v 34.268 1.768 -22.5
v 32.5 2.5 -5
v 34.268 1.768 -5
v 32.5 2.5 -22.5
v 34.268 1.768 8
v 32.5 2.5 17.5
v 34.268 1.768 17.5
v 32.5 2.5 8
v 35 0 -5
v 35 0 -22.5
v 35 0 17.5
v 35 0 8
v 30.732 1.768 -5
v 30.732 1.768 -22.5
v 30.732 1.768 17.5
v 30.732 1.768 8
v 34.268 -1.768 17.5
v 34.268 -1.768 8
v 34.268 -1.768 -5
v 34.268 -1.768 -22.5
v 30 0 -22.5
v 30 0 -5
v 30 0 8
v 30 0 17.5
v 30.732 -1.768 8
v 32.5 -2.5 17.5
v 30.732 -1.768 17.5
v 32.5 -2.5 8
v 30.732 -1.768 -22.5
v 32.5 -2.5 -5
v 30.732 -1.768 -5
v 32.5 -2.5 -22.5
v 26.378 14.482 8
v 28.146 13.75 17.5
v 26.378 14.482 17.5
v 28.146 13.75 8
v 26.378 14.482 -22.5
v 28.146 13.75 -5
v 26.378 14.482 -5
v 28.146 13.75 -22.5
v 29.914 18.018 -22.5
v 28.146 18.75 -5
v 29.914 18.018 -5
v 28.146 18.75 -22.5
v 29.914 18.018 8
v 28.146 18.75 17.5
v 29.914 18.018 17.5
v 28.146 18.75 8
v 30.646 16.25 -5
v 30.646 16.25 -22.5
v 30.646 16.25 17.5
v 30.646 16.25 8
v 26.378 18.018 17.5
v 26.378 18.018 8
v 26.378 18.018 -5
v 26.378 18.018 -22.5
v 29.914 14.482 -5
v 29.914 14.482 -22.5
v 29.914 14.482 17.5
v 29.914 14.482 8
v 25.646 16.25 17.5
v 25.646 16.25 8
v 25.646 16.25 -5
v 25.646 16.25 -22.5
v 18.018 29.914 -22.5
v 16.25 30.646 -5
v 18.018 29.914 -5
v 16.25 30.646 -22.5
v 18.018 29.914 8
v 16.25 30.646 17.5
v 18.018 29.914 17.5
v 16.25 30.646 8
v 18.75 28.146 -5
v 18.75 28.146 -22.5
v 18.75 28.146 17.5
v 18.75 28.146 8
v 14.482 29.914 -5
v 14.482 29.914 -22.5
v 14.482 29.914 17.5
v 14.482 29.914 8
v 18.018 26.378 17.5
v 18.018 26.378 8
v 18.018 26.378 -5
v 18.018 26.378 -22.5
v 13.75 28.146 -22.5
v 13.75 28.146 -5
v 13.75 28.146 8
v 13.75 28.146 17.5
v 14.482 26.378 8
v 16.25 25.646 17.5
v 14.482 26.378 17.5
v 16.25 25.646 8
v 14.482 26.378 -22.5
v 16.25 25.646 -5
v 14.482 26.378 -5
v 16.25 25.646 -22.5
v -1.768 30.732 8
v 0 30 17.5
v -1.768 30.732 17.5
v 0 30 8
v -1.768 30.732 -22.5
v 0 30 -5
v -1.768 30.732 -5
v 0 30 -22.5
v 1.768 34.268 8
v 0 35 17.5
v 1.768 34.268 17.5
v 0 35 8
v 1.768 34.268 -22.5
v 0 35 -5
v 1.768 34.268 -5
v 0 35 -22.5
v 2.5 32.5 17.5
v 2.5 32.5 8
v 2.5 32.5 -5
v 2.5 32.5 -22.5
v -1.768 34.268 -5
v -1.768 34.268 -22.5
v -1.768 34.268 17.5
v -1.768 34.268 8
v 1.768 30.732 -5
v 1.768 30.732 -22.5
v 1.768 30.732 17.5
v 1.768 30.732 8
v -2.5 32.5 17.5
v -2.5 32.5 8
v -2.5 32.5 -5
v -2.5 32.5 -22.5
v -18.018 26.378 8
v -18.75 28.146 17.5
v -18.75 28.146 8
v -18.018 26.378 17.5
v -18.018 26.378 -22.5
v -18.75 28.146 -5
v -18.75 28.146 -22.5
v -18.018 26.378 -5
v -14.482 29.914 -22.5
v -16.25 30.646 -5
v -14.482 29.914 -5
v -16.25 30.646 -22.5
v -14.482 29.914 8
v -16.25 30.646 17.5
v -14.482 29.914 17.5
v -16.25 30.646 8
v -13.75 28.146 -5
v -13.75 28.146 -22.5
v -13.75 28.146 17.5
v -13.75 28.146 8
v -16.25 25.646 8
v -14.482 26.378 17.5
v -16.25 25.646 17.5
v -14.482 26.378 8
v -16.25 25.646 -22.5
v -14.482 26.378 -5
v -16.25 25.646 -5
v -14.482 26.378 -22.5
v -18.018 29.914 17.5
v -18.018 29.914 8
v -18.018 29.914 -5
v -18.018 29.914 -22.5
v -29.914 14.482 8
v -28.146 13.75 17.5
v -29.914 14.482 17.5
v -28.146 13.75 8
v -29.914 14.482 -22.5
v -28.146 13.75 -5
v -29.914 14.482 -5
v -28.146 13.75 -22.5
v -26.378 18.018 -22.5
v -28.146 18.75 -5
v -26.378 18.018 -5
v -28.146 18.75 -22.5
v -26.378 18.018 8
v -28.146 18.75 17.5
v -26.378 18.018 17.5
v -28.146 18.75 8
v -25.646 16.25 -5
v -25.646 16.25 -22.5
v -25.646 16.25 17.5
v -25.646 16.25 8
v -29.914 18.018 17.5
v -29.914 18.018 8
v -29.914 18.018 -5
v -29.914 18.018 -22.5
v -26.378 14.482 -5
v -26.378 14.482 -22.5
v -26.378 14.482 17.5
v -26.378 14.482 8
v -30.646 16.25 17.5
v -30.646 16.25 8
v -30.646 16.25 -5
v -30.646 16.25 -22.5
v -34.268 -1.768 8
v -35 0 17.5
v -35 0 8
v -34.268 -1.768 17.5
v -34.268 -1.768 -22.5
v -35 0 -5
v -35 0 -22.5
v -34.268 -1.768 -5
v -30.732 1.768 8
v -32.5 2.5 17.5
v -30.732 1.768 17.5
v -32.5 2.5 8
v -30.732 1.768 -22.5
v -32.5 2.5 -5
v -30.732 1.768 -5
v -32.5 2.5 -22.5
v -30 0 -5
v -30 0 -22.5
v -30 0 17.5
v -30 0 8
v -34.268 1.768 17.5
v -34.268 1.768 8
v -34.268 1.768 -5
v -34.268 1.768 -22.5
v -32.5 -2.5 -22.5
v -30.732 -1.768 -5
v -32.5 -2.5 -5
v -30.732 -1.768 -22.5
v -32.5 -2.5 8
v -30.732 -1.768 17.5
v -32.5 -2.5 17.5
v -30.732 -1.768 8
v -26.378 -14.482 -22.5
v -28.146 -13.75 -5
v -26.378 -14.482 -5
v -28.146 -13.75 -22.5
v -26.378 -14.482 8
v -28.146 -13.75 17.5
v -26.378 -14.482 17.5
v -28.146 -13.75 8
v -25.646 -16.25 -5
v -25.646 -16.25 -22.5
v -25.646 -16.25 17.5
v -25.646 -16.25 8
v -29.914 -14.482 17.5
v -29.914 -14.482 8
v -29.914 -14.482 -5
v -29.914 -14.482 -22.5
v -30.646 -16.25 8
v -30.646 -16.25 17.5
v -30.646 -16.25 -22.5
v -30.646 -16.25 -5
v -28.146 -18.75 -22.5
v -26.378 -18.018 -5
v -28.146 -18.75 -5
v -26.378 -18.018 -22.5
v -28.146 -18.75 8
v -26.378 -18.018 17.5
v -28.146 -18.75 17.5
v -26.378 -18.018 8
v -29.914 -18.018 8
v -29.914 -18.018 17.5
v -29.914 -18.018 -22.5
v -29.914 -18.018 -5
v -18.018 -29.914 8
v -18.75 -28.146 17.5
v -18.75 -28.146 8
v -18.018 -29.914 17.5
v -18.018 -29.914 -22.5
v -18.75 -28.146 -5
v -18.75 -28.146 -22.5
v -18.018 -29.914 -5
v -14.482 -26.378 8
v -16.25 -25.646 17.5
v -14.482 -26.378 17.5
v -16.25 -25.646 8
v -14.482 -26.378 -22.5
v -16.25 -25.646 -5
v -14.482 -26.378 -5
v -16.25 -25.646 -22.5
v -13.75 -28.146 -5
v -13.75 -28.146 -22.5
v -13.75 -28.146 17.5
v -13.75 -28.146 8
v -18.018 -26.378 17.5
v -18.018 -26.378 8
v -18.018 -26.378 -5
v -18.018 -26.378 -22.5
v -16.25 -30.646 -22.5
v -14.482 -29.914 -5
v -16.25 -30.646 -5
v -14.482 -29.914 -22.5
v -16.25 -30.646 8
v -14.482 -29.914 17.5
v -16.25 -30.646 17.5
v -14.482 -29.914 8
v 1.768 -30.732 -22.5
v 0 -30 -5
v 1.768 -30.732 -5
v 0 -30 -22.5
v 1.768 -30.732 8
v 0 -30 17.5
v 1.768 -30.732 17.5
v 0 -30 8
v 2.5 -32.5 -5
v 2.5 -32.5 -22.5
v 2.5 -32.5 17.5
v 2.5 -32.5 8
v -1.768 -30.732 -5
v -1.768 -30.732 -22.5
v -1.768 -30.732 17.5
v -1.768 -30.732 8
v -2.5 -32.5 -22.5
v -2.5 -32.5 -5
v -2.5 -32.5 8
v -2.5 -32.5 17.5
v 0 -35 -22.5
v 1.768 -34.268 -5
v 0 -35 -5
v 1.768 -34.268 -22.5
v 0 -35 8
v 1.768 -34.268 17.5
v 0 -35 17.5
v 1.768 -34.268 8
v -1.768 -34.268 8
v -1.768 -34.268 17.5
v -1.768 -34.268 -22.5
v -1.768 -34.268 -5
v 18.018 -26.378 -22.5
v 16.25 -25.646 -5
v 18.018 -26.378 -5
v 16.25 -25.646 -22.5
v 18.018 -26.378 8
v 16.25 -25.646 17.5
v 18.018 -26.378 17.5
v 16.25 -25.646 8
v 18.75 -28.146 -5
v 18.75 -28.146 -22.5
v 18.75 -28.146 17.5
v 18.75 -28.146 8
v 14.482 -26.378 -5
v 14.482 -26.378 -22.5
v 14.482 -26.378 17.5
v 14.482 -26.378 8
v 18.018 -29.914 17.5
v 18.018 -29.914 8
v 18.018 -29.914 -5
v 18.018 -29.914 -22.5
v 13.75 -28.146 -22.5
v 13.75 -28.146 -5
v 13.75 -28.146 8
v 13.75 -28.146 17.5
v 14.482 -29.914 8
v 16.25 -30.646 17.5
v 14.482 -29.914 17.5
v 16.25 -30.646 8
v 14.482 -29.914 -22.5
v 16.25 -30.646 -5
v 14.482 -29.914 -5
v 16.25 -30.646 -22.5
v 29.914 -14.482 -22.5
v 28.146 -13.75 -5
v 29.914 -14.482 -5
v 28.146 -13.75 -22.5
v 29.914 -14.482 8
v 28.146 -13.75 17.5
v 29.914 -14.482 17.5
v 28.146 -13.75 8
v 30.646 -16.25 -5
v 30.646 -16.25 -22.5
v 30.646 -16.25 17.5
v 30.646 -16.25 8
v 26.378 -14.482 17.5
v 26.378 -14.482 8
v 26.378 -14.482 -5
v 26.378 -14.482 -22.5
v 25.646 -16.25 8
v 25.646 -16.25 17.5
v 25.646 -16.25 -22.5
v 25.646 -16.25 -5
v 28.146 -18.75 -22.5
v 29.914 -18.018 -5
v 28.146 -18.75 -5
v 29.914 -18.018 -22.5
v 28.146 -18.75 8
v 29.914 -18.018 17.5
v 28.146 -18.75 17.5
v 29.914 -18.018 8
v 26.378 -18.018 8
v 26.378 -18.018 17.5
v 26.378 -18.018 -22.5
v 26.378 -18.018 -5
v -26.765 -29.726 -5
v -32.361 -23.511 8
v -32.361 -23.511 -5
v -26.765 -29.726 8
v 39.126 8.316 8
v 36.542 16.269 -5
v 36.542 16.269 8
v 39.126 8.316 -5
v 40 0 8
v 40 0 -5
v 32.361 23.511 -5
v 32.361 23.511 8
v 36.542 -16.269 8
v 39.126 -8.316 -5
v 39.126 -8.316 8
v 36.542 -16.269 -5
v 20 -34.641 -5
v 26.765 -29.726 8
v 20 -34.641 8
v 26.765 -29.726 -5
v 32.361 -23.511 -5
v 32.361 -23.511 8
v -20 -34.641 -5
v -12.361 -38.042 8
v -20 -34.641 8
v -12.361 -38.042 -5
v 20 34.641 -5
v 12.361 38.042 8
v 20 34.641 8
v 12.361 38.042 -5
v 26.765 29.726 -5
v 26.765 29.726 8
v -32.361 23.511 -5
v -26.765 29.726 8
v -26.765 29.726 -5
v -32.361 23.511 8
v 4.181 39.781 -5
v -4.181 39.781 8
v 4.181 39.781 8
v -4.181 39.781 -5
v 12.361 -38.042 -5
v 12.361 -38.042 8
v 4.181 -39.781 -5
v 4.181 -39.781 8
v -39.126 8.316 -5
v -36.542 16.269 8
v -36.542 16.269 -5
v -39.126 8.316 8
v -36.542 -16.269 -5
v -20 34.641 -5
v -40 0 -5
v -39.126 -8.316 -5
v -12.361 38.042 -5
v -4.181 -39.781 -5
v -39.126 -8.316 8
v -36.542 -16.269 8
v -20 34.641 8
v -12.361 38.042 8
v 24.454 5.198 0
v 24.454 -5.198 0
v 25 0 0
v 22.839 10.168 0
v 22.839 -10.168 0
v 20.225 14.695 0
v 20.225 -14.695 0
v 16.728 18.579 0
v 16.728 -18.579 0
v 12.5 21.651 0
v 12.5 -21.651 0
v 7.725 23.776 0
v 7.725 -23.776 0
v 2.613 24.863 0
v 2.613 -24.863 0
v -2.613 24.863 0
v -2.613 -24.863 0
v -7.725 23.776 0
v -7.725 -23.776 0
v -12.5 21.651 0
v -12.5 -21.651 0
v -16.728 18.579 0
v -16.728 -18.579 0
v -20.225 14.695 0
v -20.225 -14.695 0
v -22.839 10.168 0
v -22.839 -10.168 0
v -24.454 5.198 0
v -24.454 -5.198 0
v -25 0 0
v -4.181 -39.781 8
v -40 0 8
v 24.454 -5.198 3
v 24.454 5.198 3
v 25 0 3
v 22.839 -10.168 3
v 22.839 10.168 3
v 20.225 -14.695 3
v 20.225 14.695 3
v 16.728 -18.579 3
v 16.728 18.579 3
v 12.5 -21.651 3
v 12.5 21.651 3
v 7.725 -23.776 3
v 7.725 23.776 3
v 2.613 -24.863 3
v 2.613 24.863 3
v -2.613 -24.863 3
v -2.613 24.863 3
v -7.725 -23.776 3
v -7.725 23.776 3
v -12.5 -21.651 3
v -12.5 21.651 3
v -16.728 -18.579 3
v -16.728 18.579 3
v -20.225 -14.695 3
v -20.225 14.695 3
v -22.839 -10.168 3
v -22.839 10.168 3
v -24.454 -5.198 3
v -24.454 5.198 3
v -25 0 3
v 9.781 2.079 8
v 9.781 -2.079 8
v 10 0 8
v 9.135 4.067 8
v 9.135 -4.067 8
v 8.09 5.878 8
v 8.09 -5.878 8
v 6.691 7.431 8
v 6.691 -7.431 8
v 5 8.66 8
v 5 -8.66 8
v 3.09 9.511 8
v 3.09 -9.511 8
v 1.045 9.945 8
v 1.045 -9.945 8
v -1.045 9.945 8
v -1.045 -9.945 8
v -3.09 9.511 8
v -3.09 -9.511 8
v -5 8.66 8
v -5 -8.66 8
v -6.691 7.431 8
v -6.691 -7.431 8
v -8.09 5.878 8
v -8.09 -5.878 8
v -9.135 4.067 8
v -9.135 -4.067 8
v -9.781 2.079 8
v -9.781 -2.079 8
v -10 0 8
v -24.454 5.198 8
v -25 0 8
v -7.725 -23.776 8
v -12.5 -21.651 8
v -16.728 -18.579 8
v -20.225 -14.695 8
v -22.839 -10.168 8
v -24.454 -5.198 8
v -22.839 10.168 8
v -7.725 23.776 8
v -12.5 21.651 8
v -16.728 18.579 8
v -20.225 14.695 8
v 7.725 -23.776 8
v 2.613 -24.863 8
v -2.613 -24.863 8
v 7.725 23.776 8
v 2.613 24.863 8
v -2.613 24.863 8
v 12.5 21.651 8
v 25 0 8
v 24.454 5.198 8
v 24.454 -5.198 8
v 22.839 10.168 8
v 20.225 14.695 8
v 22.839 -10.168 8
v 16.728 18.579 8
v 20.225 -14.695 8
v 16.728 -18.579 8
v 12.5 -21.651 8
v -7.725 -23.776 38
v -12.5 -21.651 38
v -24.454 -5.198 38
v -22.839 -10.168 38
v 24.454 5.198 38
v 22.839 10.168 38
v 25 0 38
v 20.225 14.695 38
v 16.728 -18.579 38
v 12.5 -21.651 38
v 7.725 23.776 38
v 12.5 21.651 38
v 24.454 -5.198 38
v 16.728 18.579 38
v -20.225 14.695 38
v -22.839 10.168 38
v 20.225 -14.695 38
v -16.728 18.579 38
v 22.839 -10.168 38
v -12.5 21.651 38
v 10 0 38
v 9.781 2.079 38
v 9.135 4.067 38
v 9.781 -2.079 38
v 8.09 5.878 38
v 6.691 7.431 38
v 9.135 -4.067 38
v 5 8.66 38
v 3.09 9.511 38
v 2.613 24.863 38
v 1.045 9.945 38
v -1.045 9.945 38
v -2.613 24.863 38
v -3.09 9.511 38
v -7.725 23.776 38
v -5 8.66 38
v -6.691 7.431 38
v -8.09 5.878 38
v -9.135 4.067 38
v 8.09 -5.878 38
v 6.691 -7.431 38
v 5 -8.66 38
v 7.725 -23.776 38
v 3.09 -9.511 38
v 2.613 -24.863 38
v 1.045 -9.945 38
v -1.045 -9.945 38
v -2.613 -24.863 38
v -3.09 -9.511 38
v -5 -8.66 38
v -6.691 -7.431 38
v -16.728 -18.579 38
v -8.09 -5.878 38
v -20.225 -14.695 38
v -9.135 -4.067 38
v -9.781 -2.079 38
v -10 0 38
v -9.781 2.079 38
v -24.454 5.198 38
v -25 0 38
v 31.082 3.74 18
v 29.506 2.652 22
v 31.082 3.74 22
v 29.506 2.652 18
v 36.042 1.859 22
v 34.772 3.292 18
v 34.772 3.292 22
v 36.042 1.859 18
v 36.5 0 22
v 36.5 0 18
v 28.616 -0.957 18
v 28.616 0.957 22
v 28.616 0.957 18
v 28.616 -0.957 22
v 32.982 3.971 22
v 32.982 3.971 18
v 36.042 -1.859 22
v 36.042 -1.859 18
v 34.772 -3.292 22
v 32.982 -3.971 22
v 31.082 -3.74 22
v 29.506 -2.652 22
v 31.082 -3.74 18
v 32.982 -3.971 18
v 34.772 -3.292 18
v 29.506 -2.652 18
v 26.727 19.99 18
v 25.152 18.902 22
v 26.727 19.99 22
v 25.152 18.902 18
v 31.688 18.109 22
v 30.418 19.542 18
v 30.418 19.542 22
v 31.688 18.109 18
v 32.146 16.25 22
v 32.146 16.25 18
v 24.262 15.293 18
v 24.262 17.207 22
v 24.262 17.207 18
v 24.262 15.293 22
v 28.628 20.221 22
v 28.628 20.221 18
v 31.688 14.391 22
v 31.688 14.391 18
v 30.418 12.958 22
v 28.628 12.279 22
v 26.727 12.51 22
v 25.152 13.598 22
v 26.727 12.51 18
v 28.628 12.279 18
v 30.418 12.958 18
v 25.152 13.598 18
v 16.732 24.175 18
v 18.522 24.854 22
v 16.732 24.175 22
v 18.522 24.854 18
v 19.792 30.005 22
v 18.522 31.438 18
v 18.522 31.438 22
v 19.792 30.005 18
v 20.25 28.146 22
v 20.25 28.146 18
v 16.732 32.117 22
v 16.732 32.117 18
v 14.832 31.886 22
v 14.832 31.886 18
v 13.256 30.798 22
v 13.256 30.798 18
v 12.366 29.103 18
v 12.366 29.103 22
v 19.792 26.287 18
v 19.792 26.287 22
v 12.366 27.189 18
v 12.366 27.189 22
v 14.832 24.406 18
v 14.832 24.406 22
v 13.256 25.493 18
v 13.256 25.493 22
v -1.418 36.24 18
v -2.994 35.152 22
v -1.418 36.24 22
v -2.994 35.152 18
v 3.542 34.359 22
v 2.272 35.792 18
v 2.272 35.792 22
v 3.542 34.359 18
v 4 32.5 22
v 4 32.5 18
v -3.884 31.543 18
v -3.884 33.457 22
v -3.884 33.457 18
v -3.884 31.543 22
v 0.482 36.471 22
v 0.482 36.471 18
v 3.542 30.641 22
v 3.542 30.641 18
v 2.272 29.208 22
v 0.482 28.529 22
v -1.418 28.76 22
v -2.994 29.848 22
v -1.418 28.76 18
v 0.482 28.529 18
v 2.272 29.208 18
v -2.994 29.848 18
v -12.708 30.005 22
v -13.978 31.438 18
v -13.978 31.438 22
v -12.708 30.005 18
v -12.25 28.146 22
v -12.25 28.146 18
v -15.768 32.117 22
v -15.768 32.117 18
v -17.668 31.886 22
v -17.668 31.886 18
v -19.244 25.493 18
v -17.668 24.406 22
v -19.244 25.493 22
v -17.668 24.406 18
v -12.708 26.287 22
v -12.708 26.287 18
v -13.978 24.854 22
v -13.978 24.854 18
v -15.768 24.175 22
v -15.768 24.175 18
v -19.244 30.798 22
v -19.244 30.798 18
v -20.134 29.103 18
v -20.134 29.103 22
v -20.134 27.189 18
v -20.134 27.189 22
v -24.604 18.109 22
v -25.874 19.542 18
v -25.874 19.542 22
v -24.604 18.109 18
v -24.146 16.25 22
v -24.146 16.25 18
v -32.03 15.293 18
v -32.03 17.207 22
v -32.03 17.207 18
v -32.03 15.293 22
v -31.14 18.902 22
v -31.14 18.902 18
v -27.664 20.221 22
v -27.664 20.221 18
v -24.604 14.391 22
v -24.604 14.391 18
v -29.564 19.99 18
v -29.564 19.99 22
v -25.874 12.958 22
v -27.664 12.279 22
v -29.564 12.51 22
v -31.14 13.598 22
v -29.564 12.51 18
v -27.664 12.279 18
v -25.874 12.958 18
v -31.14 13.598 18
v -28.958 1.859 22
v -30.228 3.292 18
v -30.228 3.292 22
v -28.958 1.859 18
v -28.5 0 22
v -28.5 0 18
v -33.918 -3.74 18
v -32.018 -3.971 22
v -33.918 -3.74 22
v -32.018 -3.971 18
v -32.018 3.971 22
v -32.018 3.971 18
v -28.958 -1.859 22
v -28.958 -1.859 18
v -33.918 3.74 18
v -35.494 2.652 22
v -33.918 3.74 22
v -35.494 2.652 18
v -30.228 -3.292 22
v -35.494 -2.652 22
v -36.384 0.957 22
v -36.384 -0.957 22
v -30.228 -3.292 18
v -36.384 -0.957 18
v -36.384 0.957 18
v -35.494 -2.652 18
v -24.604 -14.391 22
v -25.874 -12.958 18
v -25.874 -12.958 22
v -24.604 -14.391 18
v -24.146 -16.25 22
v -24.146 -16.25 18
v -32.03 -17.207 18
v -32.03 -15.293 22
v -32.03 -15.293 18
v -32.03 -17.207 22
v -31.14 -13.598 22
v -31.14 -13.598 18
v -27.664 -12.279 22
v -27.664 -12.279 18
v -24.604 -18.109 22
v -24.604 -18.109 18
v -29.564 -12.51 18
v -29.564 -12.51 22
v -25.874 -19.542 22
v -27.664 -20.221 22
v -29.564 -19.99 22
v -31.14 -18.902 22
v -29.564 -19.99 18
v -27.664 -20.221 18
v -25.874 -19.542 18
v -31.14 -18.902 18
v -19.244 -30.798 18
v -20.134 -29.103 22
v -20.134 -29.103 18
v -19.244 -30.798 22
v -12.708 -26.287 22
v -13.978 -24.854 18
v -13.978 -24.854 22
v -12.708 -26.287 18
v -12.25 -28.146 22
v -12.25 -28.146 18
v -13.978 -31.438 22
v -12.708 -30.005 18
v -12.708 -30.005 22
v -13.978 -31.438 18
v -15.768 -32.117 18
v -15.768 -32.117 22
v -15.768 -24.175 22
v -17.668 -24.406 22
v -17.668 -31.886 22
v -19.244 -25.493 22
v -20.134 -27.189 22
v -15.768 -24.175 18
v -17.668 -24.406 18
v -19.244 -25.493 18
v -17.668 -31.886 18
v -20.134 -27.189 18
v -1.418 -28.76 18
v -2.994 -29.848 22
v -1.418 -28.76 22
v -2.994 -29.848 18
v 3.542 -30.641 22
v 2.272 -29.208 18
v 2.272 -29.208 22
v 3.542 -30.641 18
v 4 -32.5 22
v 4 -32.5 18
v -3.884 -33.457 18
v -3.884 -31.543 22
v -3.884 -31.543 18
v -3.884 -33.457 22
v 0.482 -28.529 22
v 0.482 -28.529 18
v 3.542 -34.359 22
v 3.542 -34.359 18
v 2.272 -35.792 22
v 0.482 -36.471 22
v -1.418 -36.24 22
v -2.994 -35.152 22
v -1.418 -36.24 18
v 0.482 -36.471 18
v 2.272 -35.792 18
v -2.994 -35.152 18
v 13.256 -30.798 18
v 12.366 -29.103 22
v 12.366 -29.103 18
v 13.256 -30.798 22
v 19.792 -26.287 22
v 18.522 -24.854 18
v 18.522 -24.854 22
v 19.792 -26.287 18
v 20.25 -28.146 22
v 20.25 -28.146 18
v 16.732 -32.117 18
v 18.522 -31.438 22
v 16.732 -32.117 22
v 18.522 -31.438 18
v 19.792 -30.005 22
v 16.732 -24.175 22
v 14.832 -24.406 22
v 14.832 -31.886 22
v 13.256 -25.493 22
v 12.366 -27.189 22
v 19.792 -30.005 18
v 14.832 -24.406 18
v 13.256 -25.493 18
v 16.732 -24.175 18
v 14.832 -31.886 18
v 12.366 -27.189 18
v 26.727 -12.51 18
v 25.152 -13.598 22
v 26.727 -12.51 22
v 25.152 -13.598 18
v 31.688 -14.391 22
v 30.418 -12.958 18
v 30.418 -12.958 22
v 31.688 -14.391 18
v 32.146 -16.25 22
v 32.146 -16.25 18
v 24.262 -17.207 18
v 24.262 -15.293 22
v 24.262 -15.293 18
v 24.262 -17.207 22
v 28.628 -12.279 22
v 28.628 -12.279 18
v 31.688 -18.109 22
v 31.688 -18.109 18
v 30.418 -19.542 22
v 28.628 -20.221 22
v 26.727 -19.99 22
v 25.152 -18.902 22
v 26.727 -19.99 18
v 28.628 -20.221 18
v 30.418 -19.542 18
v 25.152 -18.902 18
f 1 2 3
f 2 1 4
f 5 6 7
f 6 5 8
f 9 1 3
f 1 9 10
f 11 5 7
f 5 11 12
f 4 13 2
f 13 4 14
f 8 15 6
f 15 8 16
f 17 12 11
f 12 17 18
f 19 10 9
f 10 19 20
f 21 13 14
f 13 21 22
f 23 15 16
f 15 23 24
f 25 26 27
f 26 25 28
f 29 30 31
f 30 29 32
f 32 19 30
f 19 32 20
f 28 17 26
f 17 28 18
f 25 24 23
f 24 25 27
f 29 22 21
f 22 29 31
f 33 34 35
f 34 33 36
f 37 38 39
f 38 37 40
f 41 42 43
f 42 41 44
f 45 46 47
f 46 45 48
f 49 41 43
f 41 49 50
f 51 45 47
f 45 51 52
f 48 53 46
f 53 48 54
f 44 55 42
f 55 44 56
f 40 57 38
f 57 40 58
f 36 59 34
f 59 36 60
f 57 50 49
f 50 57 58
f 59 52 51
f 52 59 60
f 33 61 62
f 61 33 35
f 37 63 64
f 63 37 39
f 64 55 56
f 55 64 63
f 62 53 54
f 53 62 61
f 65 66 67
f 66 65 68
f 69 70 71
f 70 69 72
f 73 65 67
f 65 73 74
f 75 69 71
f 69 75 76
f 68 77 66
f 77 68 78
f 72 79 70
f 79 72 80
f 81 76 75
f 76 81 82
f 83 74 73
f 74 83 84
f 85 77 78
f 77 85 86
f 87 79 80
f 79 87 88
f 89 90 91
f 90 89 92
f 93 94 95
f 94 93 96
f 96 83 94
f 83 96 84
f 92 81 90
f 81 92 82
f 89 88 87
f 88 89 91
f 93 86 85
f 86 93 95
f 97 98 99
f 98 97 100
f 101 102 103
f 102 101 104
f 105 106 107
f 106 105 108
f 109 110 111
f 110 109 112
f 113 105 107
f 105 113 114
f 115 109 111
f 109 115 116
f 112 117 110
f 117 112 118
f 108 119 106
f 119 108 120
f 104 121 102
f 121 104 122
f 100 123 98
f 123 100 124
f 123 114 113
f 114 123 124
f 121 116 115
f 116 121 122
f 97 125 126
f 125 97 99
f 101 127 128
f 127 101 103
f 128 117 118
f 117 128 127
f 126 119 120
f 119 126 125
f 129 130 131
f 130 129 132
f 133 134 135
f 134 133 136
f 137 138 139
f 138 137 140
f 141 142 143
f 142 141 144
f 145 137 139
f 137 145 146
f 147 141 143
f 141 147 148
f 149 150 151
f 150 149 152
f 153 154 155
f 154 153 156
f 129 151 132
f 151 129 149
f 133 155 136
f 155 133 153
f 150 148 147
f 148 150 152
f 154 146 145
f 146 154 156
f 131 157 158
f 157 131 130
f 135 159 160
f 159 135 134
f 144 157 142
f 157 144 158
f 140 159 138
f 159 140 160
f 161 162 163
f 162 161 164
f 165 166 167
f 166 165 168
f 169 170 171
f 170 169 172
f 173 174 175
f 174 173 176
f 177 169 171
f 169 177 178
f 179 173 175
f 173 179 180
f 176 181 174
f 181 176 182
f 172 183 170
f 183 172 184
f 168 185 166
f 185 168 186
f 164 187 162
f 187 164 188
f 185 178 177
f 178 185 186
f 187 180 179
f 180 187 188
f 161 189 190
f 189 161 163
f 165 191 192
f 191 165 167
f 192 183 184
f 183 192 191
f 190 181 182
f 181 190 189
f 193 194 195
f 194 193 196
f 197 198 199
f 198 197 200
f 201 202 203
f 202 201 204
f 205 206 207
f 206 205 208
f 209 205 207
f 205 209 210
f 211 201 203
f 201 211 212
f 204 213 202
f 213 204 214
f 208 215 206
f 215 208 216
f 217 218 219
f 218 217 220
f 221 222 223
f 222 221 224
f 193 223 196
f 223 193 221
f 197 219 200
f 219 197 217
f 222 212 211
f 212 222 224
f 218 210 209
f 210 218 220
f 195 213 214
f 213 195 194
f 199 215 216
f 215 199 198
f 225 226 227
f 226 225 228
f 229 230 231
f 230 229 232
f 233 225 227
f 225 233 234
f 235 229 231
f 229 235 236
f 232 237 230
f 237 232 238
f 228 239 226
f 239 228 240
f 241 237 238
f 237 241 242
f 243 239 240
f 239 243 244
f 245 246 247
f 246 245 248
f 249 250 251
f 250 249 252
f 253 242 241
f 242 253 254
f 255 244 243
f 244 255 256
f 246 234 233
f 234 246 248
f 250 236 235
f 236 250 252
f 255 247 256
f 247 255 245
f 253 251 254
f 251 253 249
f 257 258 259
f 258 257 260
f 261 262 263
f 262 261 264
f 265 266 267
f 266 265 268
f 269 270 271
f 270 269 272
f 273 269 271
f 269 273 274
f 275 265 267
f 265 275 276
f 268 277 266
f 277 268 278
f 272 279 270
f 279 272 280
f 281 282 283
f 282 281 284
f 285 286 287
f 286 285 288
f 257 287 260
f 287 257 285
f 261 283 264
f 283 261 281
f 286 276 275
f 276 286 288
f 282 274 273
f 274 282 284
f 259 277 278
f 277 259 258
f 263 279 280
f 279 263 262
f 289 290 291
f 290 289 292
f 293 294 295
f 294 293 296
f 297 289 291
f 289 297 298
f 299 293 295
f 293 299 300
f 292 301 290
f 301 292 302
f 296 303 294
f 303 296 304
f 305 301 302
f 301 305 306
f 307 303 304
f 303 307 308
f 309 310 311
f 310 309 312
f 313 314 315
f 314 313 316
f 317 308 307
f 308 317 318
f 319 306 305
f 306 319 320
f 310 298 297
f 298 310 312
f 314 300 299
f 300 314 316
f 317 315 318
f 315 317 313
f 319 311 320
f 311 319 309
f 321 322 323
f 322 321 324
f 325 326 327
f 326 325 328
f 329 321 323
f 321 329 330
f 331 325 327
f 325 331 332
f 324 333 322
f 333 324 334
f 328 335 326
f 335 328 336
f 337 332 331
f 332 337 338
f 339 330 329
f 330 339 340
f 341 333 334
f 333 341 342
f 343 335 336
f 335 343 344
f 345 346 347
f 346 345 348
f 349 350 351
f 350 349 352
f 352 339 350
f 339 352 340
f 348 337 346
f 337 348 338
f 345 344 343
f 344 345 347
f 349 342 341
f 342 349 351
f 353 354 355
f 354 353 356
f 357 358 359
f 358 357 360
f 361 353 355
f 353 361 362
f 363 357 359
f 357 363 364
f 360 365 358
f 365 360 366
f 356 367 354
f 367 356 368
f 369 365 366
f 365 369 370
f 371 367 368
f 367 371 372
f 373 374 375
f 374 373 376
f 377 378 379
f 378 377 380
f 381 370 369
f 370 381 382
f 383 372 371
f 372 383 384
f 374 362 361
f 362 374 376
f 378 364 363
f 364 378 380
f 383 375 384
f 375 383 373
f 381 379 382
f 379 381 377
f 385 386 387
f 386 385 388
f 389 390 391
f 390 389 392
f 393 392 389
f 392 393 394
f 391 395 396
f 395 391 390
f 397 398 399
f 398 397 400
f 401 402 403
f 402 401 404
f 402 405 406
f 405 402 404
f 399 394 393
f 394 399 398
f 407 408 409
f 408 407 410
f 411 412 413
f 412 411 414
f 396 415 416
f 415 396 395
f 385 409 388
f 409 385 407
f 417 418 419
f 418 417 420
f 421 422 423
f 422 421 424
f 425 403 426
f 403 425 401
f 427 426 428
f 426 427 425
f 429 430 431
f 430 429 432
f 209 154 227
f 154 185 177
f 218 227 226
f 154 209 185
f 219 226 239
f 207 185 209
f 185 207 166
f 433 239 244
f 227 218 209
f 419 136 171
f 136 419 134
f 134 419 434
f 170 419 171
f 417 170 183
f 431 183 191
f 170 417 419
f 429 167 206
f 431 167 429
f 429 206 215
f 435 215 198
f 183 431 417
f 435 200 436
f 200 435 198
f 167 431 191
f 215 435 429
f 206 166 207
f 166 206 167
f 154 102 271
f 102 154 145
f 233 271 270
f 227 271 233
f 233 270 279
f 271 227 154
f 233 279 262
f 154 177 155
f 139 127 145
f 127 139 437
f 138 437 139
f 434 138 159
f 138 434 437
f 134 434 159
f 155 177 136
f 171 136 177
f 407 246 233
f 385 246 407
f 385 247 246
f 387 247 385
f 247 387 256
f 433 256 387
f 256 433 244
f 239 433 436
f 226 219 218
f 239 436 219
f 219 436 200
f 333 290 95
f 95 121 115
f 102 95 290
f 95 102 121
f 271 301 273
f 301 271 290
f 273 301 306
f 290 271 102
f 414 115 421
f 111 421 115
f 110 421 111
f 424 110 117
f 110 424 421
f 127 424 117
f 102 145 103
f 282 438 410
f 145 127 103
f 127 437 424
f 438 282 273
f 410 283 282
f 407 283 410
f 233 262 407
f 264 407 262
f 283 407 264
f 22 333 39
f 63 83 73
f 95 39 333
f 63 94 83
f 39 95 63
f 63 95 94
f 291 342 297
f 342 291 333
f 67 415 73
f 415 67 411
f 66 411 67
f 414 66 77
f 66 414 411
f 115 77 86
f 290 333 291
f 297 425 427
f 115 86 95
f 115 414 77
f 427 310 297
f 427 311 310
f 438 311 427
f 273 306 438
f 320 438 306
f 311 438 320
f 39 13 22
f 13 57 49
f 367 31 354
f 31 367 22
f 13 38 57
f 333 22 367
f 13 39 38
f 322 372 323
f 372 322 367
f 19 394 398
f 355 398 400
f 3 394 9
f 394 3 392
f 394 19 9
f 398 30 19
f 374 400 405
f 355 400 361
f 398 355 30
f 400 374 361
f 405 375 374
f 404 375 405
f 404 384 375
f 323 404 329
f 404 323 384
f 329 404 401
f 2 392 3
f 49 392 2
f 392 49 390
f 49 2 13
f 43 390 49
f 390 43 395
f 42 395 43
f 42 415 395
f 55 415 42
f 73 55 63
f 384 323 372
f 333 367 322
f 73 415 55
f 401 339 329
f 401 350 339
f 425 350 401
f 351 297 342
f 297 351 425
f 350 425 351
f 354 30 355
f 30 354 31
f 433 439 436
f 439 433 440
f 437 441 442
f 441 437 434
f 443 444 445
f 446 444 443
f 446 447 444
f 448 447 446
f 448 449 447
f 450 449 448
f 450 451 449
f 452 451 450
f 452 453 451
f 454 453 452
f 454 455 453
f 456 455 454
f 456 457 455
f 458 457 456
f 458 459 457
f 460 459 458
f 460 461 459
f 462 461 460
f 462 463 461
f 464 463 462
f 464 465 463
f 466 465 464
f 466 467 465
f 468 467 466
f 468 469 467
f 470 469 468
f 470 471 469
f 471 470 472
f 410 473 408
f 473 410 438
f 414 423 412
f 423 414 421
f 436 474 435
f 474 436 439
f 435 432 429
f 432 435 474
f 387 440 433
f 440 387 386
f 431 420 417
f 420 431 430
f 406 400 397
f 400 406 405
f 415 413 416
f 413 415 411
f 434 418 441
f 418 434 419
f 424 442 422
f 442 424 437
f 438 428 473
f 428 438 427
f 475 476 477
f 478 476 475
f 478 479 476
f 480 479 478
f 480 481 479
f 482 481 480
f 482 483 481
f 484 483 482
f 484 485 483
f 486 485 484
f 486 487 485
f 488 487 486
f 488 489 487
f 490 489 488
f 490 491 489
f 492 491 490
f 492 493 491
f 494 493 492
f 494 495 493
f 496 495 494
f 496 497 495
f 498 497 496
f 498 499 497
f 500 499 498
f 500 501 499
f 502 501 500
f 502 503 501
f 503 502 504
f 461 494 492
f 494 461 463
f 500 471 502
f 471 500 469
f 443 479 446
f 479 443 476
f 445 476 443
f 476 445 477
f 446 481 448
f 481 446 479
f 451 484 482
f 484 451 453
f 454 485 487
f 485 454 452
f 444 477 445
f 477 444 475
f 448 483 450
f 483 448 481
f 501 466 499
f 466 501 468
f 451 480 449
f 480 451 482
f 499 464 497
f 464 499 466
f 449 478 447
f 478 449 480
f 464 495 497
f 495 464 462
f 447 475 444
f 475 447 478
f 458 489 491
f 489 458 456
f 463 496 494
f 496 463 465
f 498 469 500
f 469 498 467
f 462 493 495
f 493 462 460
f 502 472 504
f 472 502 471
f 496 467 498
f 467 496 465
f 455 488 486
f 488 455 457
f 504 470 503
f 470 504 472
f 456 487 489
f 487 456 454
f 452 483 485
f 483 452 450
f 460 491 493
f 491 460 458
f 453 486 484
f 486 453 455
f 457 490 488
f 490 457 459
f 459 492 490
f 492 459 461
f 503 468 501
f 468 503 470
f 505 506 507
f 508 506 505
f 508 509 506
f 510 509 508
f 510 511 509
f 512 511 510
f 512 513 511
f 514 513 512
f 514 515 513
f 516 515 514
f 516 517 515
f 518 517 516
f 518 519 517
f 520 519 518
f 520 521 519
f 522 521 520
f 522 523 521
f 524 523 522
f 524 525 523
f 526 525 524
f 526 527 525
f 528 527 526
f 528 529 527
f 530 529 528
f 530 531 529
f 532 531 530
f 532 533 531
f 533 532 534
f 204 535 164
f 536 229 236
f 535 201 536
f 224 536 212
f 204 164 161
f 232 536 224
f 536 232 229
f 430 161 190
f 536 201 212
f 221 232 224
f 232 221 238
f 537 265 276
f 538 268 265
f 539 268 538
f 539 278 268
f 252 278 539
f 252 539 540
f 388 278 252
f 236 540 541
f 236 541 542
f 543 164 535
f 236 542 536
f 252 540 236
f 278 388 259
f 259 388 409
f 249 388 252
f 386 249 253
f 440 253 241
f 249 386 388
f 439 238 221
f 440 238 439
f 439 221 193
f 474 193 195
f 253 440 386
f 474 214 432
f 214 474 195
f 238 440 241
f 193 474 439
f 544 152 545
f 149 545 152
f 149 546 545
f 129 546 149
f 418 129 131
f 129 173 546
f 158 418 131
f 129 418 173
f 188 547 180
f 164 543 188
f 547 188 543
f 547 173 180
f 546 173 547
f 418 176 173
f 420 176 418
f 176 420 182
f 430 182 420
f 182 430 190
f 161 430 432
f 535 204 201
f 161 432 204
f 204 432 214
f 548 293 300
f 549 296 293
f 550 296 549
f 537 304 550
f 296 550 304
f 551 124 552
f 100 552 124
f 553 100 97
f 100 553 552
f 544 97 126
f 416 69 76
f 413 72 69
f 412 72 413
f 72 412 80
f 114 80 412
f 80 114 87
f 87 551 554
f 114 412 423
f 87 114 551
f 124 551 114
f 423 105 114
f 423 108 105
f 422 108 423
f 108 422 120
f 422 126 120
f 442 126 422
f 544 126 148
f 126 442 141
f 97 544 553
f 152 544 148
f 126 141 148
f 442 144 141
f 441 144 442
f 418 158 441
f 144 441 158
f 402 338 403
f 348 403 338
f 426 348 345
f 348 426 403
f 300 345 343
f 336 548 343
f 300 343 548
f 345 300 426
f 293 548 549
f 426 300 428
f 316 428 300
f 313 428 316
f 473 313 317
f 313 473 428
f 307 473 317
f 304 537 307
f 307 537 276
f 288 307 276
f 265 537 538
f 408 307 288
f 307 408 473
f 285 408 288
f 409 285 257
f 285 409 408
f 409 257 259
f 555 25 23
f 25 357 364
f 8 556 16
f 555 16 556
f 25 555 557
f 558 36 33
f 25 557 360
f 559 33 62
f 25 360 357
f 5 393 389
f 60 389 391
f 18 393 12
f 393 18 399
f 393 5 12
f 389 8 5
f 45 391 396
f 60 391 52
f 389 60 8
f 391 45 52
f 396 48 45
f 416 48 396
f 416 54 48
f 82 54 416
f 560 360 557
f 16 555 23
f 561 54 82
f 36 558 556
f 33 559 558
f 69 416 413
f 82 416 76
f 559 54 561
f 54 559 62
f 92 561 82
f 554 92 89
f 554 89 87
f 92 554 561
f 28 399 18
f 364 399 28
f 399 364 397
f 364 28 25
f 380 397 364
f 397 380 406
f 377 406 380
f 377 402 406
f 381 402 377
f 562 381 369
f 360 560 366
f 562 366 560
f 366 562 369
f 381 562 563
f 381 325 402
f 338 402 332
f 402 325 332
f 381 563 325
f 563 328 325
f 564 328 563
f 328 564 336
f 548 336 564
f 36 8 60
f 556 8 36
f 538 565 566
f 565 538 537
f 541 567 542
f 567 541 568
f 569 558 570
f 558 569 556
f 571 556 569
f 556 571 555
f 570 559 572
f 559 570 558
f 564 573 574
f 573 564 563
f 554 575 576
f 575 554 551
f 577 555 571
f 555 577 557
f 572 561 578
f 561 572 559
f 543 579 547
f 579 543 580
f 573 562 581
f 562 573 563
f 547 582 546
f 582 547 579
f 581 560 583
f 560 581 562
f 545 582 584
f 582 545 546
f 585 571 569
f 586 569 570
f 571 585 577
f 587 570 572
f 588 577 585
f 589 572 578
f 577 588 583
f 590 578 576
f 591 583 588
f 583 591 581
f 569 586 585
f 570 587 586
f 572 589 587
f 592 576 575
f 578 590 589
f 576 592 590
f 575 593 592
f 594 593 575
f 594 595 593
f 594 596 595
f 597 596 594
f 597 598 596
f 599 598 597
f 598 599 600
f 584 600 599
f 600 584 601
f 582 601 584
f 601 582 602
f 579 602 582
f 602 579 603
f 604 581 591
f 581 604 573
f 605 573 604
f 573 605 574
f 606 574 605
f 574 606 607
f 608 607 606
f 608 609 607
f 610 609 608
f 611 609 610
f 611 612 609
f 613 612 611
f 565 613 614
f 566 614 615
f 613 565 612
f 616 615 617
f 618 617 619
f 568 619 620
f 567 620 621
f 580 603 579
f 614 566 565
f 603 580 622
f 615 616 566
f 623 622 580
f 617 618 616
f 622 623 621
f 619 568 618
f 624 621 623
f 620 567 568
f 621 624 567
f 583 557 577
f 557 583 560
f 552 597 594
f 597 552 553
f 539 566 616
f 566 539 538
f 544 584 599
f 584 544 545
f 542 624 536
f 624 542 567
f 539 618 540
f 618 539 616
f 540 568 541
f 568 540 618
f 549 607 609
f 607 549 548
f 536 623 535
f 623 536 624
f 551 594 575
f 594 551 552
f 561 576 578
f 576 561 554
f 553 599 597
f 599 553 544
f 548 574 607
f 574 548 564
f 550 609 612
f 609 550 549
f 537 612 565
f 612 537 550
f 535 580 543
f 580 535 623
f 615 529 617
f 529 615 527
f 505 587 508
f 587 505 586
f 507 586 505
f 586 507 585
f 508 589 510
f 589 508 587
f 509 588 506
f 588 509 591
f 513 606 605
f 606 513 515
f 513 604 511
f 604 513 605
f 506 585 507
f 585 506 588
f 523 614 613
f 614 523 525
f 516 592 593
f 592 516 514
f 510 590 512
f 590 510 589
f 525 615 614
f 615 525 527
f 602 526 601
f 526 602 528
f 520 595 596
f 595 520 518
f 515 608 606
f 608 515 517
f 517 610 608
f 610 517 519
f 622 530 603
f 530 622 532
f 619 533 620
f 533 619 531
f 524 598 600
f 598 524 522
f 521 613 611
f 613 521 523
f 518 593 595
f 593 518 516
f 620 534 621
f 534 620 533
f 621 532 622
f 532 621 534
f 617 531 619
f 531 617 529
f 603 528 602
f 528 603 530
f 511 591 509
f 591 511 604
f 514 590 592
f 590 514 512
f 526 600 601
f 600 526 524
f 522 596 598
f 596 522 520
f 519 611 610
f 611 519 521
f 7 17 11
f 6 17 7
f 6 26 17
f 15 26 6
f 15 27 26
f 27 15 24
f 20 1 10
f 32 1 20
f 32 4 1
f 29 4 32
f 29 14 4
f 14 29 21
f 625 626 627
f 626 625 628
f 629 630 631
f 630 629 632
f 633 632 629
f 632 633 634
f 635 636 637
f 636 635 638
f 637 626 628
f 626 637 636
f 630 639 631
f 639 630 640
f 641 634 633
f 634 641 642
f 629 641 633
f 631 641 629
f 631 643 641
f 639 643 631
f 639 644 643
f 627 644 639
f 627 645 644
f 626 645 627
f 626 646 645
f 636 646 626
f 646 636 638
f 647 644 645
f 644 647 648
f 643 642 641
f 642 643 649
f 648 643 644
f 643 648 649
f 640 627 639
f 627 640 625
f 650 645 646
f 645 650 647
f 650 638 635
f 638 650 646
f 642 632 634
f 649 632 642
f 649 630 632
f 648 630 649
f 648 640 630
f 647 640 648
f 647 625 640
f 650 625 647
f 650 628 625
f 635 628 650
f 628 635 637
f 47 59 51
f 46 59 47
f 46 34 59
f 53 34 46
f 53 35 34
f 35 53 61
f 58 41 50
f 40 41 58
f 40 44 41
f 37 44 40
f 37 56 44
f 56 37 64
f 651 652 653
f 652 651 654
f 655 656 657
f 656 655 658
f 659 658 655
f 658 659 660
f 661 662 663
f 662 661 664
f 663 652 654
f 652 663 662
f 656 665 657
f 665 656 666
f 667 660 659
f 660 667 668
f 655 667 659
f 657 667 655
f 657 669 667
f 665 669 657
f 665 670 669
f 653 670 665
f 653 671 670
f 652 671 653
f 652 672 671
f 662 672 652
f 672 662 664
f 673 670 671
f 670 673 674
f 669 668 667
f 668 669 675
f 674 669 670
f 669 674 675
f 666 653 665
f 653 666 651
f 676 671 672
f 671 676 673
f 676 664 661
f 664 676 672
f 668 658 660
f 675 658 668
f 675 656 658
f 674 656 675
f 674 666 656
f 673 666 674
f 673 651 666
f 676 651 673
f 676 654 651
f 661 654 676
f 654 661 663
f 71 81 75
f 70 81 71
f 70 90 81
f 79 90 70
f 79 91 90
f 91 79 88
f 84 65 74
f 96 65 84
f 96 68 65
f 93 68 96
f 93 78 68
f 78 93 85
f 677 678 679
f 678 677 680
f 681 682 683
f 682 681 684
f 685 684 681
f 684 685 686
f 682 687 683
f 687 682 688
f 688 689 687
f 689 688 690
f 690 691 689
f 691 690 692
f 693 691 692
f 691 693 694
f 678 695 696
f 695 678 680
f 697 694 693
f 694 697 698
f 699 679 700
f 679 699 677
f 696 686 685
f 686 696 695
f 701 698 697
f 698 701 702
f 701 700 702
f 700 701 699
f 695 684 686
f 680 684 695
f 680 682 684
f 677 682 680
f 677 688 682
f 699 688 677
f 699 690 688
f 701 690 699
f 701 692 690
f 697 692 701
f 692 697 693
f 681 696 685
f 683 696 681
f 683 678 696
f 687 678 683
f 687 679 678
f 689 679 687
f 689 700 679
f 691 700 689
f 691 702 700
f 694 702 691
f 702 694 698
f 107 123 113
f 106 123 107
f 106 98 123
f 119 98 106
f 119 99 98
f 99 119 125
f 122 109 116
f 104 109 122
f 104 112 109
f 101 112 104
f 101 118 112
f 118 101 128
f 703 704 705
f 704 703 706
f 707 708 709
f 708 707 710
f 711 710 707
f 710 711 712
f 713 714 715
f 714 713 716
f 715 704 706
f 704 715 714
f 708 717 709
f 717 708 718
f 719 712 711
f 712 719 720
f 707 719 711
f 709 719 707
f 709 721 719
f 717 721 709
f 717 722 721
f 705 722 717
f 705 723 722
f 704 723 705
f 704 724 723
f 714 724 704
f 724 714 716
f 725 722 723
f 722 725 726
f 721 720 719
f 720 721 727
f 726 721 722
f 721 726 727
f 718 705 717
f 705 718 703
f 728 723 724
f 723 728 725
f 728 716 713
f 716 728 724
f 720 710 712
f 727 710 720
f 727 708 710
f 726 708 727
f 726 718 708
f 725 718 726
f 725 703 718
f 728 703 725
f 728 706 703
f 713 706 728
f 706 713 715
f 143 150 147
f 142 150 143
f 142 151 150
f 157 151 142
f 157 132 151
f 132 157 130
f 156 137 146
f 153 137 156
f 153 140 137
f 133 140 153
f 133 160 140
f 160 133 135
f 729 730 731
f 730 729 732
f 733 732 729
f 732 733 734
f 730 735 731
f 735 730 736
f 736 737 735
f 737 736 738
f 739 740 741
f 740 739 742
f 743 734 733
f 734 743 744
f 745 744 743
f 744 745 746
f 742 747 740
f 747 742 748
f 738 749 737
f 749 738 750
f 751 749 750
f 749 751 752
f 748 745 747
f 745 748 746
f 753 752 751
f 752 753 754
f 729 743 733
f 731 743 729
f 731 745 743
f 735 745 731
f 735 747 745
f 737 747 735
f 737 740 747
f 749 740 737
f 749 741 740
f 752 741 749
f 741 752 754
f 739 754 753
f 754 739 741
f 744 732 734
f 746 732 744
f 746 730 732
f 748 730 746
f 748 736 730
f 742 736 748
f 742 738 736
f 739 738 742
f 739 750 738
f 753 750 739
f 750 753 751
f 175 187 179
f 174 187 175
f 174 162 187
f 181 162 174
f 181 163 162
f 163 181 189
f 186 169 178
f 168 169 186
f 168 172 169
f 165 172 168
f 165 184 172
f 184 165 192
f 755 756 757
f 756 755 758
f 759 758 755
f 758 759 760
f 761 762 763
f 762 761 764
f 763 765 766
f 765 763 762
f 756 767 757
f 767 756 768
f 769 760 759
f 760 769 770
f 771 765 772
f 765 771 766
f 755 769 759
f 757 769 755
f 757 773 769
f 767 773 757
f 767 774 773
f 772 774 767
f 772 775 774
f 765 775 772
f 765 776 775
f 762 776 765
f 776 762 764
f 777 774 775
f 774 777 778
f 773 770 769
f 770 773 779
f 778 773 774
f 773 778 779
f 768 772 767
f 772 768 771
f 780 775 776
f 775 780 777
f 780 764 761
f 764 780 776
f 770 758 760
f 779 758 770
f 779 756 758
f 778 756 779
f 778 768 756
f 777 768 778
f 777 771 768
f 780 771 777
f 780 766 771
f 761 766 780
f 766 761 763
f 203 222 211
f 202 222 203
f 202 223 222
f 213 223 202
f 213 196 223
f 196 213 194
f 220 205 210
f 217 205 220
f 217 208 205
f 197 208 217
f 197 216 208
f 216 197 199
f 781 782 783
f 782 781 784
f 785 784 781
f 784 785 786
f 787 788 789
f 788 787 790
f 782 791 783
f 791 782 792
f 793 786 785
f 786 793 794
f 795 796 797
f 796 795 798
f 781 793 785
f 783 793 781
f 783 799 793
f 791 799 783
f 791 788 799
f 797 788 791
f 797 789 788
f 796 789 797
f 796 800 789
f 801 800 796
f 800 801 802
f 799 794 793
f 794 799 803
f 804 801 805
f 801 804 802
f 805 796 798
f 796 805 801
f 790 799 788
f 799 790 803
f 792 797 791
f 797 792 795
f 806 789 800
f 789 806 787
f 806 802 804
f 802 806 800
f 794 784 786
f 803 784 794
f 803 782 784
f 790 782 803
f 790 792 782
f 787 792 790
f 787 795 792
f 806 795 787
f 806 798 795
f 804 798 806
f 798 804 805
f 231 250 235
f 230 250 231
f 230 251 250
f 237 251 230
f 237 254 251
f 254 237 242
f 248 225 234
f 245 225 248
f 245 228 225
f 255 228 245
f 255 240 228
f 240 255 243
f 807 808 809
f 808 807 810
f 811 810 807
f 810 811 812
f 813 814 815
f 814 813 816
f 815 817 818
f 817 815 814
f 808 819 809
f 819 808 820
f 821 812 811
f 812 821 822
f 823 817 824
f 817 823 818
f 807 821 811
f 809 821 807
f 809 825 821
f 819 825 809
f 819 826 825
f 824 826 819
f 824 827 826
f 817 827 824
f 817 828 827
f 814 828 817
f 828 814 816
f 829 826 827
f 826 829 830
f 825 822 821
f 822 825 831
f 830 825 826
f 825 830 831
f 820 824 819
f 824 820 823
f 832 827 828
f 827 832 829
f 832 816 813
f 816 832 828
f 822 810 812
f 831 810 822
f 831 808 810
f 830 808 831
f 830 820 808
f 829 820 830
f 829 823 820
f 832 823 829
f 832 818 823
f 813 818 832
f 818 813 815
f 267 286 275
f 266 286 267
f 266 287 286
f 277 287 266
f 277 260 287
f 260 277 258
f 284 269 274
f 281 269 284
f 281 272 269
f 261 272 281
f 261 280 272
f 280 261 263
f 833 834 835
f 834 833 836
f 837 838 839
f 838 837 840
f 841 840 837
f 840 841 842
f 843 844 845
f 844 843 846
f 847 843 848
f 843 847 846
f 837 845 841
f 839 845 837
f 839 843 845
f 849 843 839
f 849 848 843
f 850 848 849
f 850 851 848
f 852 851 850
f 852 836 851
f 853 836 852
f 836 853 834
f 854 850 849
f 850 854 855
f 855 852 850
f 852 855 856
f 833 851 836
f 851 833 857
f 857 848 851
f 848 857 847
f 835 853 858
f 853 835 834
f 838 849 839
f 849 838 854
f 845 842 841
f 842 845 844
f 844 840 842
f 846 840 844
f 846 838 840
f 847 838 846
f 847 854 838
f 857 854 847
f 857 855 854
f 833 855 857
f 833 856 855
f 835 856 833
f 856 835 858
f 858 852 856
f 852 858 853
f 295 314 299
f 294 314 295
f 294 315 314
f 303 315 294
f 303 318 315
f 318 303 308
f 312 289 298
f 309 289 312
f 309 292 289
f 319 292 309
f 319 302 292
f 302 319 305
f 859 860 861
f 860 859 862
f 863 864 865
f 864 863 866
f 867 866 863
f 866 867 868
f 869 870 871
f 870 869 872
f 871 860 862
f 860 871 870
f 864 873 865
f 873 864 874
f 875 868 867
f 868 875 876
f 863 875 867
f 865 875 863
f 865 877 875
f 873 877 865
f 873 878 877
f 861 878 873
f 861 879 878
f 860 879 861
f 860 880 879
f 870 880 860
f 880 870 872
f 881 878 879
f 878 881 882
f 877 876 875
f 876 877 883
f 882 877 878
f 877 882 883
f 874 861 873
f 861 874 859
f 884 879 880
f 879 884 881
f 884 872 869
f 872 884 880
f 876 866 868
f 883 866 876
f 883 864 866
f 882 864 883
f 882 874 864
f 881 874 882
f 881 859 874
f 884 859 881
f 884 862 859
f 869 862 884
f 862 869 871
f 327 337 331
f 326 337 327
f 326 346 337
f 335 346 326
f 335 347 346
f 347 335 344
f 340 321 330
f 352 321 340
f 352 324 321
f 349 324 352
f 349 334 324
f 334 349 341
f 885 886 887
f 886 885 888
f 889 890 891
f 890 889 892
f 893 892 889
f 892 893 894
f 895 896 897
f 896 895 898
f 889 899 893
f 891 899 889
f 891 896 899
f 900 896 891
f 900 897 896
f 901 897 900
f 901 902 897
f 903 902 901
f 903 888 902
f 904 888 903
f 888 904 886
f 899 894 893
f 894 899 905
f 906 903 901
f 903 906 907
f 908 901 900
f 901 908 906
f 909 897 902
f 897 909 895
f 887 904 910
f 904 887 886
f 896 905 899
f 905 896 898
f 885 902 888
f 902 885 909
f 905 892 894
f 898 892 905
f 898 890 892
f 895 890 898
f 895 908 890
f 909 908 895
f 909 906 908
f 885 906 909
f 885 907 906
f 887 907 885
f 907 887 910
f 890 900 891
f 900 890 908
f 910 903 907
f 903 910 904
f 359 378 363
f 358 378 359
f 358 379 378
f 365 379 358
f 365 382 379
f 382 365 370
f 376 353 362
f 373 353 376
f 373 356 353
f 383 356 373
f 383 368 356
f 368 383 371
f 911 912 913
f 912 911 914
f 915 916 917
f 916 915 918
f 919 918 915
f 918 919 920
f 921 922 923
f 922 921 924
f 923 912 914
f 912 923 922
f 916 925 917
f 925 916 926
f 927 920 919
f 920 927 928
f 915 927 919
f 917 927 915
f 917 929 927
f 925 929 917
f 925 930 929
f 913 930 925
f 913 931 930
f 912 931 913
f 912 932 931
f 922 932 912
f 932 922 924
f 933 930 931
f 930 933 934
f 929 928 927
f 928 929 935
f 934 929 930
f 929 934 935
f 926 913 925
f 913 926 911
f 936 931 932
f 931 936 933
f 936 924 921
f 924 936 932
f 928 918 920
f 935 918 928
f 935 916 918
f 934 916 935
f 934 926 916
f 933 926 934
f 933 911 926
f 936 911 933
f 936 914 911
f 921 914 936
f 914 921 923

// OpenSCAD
// Parameters
hub_diameter = 50;
hub_height = 30;
hub_hole_diameter = 20;
flange_diameter = 80;
flange_thickness = 5;
spacer_thickness = 3;
bolt_diameter = 5;
bolt_length = 40;
num_bolts = 12;
bolt_circle_diameter = 65;

// Main hub
module main_hub() {
    difference() {
        cylinder(h = hub_height, d = hub_diameter, center = true);
        cylinder(h = hub_height + 2, d = hub_hole_diameter, center = true);
    }
}

// Flange plate
module flange_plate() {
    difference() {
        cylinder(h = flange_thickness, d = flange_diameter, center = true);
        for (i = [0:num_bolts-1]) {
            angle = i * 360 / num_bolts;
            translate([bolt_circle_diameter/2 * cos(angle), bolt_circle_diameter/2 * sin(angle), 0])
                cylinder(h = flange_thickness + 2, d = bolt_diameter, center = true);
        }
    }
}

// Spacer ring
module spacer_ring() {
    difference() {
        cylinder(h = spacer_thickness, d = flange_diameter, center = true);
        cylinder(h = spacer_thickness + 2, d = hub_diameter, center = true);
    }
}

// Bolt
module bolt() {
    cylinder(h = bolt_length, d = bolt_diameter, center = true);
}

// Nut
module nut() {
    cylinder(h = 4, d = 8, center = true);
}

// Assembly
module coupling_assembly() {
    // Bottom flange plate
    translate([0, 0, -flange_thickness/2])
        flange_plate();
    
    // Spacer ring
    translate([0, 0, spacer_thickness/2])
        spacer_ring();
    
    // Top flange plate
    translate([0, 0, spacer_thickness + flange_thickness/2])
        flange_plate();
    
    // Main hub
    translate([0, 0, spacer_thickness + flange_thickness + hub_height/2])
        main_hub();
    
    // Bolts and nuts
    for (i = [0:num_bolts-1]) {
        angle = i * 360 / num_bolts;
        translate([bolt_circle_diameter/2 * cos(angle), bolt_circle_diameter/2 * sin(angle), -flange_thickness/2])
            bolt();
        translate([bolt_circle_diameter/2 * cos(angle), bolt_circle_diameter/2 * sin(angle), bolt_length/2])
            nut();
    }
}

// Render the assembly
coupling_assembly();
